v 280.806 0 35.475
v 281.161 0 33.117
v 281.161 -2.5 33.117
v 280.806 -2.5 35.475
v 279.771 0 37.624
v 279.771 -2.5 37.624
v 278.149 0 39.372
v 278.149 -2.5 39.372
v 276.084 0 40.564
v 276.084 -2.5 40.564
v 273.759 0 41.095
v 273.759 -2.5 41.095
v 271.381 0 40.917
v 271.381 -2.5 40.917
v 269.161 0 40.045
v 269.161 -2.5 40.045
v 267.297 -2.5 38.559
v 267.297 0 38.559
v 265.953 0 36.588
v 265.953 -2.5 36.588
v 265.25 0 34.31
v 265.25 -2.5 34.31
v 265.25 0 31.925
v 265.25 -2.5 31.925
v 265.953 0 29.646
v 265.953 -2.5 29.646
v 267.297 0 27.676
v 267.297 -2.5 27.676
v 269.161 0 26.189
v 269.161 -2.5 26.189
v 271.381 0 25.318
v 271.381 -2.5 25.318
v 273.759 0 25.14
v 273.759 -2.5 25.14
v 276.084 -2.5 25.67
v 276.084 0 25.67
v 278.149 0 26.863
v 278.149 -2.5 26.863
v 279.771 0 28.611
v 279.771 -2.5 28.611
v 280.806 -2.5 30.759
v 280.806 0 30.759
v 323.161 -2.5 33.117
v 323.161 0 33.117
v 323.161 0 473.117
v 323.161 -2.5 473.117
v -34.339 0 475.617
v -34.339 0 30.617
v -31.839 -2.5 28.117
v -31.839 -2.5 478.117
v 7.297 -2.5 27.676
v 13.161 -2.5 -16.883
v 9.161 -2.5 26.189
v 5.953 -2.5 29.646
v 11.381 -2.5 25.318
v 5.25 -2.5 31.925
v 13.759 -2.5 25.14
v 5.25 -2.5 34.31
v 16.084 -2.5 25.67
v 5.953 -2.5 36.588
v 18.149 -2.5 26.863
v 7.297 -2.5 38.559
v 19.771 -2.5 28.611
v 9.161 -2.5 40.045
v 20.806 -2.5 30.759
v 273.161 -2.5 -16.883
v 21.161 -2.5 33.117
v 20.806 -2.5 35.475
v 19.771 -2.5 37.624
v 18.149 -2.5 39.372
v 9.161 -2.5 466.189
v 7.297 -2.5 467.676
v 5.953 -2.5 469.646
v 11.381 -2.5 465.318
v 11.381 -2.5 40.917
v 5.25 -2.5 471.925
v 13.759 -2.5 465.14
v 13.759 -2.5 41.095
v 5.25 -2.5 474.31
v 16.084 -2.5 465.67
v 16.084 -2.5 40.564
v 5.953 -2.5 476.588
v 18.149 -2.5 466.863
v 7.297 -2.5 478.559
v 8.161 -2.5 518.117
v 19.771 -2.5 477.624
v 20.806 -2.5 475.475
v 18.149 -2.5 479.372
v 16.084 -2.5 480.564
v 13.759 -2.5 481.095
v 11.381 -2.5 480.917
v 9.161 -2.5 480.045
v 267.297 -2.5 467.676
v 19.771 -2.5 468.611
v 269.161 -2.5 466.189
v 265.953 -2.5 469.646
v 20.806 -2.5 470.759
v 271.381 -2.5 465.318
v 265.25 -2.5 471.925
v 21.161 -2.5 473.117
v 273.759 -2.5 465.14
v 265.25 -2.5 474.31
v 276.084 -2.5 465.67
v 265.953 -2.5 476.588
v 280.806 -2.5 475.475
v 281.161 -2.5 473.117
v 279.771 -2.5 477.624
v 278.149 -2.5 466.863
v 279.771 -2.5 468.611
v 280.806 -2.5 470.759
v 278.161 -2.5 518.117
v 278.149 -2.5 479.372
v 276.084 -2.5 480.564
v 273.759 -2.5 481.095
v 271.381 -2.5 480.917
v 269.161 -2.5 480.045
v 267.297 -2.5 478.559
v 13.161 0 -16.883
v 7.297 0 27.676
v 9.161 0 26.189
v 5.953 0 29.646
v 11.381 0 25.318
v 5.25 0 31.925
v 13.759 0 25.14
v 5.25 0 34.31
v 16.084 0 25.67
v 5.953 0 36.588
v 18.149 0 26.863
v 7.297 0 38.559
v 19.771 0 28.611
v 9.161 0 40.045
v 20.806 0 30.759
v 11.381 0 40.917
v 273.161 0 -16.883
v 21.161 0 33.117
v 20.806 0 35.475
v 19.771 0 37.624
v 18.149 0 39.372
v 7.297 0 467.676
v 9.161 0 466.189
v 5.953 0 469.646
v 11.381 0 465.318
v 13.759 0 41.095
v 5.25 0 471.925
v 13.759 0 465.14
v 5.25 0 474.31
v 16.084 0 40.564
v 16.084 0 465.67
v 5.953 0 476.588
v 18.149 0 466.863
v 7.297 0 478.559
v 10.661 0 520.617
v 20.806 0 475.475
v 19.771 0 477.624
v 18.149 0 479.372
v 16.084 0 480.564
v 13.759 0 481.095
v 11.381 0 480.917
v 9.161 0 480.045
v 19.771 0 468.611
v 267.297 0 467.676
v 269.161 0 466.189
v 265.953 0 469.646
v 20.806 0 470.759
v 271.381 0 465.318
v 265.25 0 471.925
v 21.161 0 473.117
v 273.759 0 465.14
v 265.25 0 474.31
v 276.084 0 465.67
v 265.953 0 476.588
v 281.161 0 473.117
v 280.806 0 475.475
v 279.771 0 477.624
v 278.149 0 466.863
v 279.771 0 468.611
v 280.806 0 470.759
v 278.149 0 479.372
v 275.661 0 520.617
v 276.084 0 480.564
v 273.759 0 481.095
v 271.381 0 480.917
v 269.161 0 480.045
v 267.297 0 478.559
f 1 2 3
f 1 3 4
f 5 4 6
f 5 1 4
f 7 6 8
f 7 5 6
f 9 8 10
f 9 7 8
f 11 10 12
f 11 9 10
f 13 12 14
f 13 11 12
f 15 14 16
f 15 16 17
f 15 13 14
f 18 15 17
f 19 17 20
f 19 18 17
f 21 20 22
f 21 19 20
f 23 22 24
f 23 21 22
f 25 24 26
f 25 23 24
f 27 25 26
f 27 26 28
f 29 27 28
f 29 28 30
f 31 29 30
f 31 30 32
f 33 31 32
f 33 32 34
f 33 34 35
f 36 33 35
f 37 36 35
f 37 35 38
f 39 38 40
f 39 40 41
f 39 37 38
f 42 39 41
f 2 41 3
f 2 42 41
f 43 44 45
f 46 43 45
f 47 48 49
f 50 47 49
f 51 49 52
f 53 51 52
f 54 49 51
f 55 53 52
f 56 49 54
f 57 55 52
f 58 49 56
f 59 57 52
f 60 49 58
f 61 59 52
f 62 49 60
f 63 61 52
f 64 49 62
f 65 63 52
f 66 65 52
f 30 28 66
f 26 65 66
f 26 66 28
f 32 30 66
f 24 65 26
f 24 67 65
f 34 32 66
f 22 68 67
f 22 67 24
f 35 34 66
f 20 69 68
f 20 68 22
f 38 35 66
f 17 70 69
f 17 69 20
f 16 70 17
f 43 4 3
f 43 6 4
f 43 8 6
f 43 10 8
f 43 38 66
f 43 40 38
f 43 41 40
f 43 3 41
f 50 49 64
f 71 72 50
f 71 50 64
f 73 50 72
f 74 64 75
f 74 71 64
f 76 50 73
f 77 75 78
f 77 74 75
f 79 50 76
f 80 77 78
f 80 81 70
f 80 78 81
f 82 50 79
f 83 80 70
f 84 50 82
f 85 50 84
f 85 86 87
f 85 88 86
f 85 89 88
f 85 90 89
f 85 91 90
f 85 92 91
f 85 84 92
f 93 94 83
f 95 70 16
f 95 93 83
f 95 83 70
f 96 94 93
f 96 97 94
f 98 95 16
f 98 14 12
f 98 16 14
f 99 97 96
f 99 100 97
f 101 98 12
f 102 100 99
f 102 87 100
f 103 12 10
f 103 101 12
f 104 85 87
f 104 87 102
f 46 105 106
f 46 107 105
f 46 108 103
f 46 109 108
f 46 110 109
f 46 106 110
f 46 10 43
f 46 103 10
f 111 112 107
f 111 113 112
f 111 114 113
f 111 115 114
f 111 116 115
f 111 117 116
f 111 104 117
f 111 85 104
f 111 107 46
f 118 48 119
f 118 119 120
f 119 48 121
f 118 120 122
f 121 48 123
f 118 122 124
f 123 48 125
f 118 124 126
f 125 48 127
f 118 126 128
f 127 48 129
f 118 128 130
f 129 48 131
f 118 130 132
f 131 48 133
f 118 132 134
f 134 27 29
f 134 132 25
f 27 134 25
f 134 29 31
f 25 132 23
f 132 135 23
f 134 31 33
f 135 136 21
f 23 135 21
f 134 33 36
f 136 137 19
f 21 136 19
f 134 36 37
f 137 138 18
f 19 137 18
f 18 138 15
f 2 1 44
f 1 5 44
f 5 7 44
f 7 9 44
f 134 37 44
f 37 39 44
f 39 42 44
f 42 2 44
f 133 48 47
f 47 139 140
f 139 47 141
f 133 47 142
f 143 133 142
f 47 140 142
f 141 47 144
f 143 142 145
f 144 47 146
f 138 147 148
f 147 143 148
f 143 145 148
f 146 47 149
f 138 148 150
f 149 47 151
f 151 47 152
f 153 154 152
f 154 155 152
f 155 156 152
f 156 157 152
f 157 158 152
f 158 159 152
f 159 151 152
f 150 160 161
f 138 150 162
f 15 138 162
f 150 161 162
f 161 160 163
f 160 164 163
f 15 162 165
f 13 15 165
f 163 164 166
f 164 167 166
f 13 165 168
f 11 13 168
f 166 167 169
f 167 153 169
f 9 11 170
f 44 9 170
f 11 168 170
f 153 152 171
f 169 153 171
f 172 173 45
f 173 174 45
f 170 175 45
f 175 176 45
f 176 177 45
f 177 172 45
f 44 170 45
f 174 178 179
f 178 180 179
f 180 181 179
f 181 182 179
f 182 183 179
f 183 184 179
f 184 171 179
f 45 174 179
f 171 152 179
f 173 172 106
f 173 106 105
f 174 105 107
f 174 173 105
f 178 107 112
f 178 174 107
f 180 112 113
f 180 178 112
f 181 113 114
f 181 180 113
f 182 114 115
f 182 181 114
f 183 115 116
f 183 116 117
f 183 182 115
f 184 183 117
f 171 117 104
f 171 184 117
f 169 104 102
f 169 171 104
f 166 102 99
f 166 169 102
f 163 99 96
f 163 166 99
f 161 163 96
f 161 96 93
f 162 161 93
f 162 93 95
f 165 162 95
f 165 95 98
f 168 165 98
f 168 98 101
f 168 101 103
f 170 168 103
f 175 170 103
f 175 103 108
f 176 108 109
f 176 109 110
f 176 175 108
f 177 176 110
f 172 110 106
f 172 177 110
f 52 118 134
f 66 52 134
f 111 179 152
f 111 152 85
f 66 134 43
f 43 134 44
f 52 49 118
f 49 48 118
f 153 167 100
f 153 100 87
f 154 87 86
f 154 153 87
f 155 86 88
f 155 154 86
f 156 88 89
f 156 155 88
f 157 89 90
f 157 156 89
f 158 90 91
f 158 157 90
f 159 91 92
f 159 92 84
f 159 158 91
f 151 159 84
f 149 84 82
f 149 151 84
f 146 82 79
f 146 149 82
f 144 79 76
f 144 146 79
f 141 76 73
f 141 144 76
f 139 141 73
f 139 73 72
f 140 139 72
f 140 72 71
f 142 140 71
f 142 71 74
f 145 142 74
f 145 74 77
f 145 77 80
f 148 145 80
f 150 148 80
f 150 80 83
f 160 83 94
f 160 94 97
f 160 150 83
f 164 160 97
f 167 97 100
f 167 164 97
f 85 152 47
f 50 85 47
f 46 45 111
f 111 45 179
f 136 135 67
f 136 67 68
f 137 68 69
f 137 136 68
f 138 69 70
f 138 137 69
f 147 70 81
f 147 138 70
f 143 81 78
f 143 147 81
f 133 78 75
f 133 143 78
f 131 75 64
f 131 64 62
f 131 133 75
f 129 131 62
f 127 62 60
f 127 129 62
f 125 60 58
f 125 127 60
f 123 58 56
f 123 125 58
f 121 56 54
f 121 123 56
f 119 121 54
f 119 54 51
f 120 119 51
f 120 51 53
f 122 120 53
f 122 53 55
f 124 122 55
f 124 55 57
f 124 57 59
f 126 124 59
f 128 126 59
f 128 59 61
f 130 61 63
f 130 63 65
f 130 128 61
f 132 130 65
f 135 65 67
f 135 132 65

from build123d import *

# Parameters (mm, degrees)
F0_R        = 8
F1_DEPTH    = 2.5
F2_T1_DEPTH = 285.7168298797
F2_T3_DEPTH = 465.7168298797


# Not quite as in the source:
# - a fillet or chamfer that OpenCascade refuses, or shapes differently, is made with other operations: its cross-section is extruded or revolved along the edge and cut away or added


with BuildPart() as f1:
    # F0 (on Front) → F1 (new body)
    with BuildSketch(Plane.XZ):
        Polygon((273.1609285387, 523.1172461575), (13.1609285387, 523.1172461575), (-36.8390714613, 473.1172461575), (-36.8390714613, 33.1172461575), (13.1609285387, -16.8827538425), (273.1609285387, -16.8827538425), (323.1609285387, 33.1172461575), (323.1609285387, 473.1172461575), align=None)
        with Locations((13.1609285387, 33.1172461575)):
            Circle(F0_R, mode=Mode.SUBTRACT)
        with Locations((273.1609285387, 33.1172461575)):
            Circle(F0_R, mode=Mode.SUBTRACT)
        with Locations((13.1609285387, 473.1172461575)):
            Circle(F0_R, mode=Mode.SUBTRACT)
        with Locations((273.1609285387, 473.1172461575)):
            Circle(F0_R, mode=Mode.SUBTRACT)
    extrude(amount=F1_DEPTH)

    # F2: chamfer of 5 on 2 edges, made by hand

    # F2_s2 → F2_t1 (cut)
    with BuildSketch(Plane.YZ.offset(0.3025135989)):
        Polygon((2.5, 523.1172461575), (-2.5, 518.1172461575), (-2.5, 523.1172461575), align=None)
    extrude(amount=F2_T1_DEPTH, mode=Mode.SUBTRACT)

    # F2_s4 → F2_t3 (cut)
    with BuildSketch(Plane.XY.offset(20.2588312177)):
        Polygon((-36.8390714613, 2.5), (-31.8390714613, -2.5), (-36.8390714613, -2.5), align=None)
    extrude(amount=F2_T3_DEPTH, mode=Mode.SUBTRACT)


solid = f1.part
